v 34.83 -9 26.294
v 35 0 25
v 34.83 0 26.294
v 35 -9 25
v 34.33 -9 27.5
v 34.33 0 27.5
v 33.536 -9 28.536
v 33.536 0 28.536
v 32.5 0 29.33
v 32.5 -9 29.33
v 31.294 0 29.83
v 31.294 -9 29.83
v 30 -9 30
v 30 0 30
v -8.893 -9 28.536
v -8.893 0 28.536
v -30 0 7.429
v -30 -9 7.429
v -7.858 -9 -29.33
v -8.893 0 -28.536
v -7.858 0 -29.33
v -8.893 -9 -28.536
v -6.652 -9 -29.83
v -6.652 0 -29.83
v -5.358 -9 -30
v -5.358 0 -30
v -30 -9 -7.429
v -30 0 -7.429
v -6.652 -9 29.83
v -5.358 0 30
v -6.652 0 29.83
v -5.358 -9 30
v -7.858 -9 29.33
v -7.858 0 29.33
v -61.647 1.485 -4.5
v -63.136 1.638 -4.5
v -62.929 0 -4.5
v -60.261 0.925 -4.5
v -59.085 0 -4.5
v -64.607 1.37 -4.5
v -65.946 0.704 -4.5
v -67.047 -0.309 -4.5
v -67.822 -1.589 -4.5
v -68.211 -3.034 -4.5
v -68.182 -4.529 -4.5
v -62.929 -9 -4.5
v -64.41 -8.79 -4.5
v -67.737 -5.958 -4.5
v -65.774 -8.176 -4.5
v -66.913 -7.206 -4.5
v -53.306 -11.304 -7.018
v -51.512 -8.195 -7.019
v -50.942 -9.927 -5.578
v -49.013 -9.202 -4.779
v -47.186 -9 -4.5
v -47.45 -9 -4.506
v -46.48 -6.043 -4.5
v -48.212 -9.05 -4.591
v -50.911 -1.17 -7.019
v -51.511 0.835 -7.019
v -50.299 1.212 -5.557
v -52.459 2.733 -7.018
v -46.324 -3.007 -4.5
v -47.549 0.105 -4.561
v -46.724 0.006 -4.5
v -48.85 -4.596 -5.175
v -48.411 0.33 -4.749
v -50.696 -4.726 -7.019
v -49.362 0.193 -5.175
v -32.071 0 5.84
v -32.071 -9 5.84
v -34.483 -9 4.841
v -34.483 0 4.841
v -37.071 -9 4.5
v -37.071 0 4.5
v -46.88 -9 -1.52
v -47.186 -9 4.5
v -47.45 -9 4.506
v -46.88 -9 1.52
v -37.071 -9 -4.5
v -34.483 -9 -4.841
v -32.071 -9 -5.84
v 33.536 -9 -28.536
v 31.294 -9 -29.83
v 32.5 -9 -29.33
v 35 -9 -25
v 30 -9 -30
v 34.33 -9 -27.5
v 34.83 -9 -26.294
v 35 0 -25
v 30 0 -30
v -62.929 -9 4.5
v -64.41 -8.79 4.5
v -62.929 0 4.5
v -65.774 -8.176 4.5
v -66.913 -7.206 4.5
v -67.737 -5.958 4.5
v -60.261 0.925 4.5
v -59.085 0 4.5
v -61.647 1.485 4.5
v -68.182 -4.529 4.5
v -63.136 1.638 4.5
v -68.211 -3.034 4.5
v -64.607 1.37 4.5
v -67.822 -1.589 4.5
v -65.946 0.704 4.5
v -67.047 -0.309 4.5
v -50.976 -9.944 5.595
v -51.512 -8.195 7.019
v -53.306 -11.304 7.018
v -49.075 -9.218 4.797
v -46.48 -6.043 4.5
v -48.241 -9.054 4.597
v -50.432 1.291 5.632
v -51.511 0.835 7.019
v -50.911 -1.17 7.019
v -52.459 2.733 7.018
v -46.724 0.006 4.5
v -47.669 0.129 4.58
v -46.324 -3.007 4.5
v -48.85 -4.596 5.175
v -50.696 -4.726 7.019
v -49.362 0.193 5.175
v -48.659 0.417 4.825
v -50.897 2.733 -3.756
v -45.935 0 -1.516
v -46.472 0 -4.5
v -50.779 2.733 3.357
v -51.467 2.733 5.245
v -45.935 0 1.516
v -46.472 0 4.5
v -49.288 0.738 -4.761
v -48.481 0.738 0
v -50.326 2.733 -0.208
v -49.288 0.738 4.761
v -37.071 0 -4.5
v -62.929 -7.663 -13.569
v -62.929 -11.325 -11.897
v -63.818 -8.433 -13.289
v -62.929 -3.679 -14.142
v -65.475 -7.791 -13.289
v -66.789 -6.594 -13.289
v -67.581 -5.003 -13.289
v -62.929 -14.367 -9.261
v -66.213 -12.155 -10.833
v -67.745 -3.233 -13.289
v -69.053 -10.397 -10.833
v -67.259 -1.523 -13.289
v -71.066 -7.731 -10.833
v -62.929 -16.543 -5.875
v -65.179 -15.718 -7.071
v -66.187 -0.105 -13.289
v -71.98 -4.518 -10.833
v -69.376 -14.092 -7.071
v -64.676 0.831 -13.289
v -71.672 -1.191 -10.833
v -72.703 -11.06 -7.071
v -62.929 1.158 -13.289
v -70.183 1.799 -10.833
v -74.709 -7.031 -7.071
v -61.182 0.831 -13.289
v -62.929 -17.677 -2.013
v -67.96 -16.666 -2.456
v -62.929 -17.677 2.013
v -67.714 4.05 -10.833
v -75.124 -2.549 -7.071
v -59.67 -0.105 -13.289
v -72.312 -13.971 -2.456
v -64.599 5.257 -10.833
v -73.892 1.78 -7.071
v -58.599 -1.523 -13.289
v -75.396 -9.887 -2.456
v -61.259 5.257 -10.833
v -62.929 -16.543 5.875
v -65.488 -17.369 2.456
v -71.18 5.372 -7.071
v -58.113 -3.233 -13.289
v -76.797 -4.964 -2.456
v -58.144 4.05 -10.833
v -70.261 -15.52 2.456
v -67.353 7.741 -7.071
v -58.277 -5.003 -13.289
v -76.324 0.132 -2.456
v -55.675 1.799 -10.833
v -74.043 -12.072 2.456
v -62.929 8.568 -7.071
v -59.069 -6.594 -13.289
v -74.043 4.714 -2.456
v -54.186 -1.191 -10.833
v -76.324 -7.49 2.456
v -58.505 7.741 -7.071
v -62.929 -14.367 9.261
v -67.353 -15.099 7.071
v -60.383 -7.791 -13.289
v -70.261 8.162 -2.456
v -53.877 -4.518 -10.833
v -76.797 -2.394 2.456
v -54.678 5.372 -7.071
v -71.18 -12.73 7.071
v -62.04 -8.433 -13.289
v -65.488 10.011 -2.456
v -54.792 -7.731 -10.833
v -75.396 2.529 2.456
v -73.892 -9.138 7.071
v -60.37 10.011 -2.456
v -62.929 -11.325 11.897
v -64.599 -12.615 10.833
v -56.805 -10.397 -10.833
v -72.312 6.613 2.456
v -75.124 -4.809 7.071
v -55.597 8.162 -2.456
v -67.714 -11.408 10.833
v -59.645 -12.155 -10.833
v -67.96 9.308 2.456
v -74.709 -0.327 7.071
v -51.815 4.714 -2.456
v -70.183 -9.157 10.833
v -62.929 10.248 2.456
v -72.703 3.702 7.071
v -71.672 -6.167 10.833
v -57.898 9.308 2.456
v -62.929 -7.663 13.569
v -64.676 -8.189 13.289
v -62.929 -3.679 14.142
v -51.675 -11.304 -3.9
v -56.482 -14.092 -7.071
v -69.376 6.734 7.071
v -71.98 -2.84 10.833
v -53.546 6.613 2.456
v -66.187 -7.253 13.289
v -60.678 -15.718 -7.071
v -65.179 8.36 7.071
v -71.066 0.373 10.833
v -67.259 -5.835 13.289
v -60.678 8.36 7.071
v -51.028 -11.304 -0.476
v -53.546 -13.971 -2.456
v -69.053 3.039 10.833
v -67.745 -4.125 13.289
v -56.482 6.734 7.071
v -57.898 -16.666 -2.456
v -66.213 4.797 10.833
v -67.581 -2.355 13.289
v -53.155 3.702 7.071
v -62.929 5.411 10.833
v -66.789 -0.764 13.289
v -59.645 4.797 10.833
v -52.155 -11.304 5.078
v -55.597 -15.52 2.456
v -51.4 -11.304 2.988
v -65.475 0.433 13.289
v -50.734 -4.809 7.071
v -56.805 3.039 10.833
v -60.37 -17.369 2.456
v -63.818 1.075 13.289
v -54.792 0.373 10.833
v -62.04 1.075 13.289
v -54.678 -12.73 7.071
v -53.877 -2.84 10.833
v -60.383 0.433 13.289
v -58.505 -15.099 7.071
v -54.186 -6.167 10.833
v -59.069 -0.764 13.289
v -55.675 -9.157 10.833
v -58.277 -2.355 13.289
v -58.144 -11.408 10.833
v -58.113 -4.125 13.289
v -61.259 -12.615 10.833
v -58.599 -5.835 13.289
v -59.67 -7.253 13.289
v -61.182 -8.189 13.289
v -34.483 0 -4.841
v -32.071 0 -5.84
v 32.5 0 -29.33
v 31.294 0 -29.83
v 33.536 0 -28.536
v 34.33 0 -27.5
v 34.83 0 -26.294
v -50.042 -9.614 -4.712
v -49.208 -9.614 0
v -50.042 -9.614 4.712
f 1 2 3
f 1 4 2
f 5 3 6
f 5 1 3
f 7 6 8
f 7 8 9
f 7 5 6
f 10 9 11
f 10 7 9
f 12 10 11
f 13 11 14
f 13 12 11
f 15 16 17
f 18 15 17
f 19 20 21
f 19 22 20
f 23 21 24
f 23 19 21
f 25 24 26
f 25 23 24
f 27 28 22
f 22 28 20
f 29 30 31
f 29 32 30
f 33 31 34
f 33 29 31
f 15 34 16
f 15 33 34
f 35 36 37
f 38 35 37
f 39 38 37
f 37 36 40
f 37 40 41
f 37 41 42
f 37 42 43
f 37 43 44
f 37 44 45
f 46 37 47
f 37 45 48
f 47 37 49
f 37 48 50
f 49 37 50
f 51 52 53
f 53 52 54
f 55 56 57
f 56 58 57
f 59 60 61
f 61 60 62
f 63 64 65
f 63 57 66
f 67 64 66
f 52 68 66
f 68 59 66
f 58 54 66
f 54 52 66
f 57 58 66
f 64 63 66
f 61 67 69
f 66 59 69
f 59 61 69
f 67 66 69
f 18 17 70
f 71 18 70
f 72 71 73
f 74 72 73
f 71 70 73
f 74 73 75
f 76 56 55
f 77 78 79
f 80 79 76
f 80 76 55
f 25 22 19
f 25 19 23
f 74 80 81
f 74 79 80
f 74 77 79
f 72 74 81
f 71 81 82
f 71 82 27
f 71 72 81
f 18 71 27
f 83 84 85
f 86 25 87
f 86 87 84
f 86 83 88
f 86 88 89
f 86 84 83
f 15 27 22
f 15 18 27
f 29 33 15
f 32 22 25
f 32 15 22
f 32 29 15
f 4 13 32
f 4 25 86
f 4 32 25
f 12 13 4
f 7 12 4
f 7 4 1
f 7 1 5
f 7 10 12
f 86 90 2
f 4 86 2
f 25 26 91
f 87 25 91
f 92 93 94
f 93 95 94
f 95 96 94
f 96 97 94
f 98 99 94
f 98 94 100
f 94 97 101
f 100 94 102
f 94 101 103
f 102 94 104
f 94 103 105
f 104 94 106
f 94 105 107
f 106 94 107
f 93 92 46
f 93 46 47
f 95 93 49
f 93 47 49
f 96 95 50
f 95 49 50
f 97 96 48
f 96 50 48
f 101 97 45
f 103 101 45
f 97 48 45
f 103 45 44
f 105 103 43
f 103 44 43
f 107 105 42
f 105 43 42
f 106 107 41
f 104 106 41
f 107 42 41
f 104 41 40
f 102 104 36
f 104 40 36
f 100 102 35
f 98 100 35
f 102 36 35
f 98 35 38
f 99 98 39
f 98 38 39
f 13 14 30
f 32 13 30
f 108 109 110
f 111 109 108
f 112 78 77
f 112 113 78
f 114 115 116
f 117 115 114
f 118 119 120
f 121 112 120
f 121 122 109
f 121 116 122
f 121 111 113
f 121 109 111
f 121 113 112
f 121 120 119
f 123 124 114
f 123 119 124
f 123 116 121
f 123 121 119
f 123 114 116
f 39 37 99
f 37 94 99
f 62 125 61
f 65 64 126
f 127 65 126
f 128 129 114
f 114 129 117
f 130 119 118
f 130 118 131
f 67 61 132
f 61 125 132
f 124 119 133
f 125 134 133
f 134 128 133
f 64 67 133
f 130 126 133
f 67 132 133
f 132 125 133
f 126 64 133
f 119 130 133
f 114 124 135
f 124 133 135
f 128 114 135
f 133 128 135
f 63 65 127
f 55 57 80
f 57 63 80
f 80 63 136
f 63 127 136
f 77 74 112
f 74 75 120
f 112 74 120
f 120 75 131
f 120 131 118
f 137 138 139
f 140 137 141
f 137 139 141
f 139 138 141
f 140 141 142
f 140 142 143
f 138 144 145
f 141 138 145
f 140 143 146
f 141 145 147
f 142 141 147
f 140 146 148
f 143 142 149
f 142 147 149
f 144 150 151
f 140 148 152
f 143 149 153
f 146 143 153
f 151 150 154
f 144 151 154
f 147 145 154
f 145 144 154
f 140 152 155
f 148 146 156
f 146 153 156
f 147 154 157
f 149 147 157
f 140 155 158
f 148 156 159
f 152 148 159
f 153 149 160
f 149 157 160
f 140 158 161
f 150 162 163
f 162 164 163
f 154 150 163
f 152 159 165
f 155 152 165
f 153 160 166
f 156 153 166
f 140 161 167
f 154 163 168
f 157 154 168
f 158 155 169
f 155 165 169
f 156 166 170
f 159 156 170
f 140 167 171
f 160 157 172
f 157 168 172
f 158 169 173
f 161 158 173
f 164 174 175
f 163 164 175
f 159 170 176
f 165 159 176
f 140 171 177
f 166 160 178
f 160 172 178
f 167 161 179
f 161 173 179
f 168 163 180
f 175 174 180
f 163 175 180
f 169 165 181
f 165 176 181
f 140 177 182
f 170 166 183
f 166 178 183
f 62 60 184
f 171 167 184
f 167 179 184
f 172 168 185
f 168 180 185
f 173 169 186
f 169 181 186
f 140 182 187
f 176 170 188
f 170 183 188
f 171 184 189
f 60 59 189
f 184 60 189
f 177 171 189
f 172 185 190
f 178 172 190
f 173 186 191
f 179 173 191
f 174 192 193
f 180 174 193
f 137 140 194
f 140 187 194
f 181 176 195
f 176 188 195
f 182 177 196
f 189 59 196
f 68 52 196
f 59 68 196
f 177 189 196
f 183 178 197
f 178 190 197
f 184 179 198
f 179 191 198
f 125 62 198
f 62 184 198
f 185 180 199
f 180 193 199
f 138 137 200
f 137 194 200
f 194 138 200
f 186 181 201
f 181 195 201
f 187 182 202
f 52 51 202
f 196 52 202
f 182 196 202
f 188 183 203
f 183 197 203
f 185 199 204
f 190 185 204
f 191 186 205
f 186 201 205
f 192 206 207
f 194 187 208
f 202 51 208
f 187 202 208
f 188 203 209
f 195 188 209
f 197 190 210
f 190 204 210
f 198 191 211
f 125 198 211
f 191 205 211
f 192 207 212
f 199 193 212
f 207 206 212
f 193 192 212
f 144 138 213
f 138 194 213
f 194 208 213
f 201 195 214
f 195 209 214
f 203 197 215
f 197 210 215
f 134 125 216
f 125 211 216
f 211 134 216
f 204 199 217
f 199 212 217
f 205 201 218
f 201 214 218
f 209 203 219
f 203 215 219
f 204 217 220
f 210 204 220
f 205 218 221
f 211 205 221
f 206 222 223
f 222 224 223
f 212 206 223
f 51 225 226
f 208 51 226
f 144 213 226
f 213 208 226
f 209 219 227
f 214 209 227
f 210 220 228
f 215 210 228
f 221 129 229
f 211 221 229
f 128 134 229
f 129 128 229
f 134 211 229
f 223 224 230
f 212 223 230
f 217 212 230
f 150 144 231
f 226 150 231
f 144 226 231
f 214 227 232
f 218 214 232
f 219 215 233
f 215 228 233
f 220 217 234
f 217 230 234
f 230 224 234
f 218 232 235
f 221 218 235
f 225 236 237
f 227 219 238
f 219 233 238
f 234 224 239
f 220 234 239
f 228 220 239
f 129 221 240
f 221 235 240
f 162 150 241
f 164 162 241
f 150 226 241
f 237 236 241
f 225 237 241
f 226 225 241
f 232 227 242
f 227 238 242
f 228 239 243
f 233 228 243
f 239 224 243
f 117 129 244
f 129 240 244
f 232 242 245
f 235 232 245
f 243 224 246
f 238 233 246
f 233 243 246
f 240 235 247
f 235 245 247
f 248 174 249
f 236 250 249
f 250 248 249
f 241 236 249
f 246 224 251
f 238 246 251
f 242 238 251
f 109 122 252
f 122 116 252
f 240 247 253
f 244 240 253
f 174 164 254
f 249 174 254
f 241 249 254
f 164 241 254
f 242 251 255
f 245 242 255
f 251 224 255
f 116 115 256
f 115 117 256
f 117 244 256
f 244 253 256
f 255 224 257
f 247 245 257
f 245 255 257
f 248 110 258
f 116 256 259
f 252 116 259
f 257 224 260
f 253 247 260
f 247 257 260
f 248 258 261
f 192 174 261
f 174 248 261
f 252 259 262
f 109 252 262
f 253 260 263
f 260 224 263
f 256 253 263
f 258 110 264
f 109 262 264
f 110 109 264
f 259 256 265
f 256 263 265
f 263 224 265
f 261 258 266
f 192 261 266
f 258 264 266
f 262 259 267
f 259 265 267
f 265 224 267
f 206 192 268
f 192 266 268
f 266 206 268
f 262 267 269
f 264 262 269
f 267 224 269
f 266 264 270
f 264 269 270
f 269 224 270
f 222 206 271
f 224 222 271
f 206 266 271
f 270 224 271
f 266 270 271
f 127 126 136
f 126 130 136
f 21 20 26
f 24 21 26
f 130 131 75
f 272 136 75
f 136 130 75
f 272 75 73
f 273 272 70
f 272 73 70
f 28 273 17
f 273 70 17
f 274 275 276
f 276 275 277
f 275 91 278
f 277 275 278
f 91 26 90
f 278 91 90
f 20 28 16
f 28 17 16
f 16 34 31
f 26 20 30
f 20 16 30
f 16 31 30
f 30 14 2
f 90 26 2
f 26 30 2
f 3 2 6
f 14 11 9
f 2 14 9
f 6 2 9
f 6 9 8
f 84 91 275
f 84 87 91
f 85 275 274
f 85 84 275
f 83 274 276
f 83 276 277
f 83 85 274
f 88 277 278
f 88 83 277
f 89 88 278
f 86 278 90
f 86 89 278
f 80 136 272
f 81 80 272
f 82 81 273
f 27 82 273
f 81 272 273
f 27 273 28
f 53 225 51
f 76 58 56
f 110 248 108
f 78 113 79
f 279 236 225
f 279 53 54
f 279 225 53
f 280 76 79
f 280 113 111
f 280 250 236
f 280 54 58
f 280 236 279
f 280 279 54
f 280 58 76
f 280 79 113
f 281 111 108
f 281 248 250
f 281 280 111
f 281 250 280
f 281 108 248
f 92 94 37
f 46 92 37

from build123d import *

# Parameters (mm, degrees)
F1_DEPTH = 9
F4_R     = 5
F5_R     = 5


with BuildPart() as f1:
    # F0 (on Front) → F1 (new body)
    with BuildSketch(Plane.XZ):
        with BuildLine():
            Line((35, -30), (35, 30))
            Line((35, 30), (-7.4289321881, 30))
            Line((-7.4289321881, 30), (-30, 7.4289321881))
            ThreePointArc((-30, 7.4289321881), (-33.2442334882, 5.2612046749), (-37.0710678119, 4.5))
            Line((-37.0710678119, 4.5), (-62.9289321881, 4.5))
            Line((-62.9289321881, 4.5), (-62.9289321881, -4.5))
            Line((-62.9289321881, -4.5), (-37.0710678119, -4.5))
            ThreePointArc((-37.0710678119, -4.5), (-33.2442334882, -5.2612046749), (-30, -7.4289321881))
            Line((-30, -7.4289321881), (-7.4289321881, -30))
            Line((-7.4289321881, -30), (35, -30))
        make_face()
    extrude(amount=F1_DEPTH)

    # F2 (on face) → F3 (revolve)
    with BuildSketch(Plane(origin=(-62.9289321881, 0, 0), x_dir=(0, -1, 0), z_dir=(-1, 0, 0))):
        with BuildLine():
            Line((3.679, -4.5), (3.679, -14.142))
            ThreePointArc((3.679, -14.142), (17.821, 0), (3.679, 14.142))
            Line((3.679, 14.142), (3.679, 4.5))
            Line((3.679, 4.5), (9, 4.5))
            Line((9, 4.5), (9, -4.5))
            Line((9, -4.5), (3.679, -4.5))
        make_face()
    revolve(axis=Axis((-62.9289321881, -3.679, 0), (0, 0, -1)))

    # F4
    f4_edges = [f1.edges().sort_by_distance(p)[0] for p in [
        (-49.550362, -4.550796, 4.5),
        (-49.273855, 0, 0),
        (-49.550362, -4.550796, -4.5),
        (-49.826142, -9, 0),
    ]]
    fillet(f4_edges, radius=F4_R)

    # F5
    f5_edges = [f1.edges().sort_by_distance(p)[0] for p in [
        (35, -4.5, -30),
        (35, -4.5, 30),
        (-7.428932, -4.5, 30),
        (-7.428932, -4.5, -30),
    ]]
    fillet(f5_edges, radius=F5_R)


solid = f1.part
